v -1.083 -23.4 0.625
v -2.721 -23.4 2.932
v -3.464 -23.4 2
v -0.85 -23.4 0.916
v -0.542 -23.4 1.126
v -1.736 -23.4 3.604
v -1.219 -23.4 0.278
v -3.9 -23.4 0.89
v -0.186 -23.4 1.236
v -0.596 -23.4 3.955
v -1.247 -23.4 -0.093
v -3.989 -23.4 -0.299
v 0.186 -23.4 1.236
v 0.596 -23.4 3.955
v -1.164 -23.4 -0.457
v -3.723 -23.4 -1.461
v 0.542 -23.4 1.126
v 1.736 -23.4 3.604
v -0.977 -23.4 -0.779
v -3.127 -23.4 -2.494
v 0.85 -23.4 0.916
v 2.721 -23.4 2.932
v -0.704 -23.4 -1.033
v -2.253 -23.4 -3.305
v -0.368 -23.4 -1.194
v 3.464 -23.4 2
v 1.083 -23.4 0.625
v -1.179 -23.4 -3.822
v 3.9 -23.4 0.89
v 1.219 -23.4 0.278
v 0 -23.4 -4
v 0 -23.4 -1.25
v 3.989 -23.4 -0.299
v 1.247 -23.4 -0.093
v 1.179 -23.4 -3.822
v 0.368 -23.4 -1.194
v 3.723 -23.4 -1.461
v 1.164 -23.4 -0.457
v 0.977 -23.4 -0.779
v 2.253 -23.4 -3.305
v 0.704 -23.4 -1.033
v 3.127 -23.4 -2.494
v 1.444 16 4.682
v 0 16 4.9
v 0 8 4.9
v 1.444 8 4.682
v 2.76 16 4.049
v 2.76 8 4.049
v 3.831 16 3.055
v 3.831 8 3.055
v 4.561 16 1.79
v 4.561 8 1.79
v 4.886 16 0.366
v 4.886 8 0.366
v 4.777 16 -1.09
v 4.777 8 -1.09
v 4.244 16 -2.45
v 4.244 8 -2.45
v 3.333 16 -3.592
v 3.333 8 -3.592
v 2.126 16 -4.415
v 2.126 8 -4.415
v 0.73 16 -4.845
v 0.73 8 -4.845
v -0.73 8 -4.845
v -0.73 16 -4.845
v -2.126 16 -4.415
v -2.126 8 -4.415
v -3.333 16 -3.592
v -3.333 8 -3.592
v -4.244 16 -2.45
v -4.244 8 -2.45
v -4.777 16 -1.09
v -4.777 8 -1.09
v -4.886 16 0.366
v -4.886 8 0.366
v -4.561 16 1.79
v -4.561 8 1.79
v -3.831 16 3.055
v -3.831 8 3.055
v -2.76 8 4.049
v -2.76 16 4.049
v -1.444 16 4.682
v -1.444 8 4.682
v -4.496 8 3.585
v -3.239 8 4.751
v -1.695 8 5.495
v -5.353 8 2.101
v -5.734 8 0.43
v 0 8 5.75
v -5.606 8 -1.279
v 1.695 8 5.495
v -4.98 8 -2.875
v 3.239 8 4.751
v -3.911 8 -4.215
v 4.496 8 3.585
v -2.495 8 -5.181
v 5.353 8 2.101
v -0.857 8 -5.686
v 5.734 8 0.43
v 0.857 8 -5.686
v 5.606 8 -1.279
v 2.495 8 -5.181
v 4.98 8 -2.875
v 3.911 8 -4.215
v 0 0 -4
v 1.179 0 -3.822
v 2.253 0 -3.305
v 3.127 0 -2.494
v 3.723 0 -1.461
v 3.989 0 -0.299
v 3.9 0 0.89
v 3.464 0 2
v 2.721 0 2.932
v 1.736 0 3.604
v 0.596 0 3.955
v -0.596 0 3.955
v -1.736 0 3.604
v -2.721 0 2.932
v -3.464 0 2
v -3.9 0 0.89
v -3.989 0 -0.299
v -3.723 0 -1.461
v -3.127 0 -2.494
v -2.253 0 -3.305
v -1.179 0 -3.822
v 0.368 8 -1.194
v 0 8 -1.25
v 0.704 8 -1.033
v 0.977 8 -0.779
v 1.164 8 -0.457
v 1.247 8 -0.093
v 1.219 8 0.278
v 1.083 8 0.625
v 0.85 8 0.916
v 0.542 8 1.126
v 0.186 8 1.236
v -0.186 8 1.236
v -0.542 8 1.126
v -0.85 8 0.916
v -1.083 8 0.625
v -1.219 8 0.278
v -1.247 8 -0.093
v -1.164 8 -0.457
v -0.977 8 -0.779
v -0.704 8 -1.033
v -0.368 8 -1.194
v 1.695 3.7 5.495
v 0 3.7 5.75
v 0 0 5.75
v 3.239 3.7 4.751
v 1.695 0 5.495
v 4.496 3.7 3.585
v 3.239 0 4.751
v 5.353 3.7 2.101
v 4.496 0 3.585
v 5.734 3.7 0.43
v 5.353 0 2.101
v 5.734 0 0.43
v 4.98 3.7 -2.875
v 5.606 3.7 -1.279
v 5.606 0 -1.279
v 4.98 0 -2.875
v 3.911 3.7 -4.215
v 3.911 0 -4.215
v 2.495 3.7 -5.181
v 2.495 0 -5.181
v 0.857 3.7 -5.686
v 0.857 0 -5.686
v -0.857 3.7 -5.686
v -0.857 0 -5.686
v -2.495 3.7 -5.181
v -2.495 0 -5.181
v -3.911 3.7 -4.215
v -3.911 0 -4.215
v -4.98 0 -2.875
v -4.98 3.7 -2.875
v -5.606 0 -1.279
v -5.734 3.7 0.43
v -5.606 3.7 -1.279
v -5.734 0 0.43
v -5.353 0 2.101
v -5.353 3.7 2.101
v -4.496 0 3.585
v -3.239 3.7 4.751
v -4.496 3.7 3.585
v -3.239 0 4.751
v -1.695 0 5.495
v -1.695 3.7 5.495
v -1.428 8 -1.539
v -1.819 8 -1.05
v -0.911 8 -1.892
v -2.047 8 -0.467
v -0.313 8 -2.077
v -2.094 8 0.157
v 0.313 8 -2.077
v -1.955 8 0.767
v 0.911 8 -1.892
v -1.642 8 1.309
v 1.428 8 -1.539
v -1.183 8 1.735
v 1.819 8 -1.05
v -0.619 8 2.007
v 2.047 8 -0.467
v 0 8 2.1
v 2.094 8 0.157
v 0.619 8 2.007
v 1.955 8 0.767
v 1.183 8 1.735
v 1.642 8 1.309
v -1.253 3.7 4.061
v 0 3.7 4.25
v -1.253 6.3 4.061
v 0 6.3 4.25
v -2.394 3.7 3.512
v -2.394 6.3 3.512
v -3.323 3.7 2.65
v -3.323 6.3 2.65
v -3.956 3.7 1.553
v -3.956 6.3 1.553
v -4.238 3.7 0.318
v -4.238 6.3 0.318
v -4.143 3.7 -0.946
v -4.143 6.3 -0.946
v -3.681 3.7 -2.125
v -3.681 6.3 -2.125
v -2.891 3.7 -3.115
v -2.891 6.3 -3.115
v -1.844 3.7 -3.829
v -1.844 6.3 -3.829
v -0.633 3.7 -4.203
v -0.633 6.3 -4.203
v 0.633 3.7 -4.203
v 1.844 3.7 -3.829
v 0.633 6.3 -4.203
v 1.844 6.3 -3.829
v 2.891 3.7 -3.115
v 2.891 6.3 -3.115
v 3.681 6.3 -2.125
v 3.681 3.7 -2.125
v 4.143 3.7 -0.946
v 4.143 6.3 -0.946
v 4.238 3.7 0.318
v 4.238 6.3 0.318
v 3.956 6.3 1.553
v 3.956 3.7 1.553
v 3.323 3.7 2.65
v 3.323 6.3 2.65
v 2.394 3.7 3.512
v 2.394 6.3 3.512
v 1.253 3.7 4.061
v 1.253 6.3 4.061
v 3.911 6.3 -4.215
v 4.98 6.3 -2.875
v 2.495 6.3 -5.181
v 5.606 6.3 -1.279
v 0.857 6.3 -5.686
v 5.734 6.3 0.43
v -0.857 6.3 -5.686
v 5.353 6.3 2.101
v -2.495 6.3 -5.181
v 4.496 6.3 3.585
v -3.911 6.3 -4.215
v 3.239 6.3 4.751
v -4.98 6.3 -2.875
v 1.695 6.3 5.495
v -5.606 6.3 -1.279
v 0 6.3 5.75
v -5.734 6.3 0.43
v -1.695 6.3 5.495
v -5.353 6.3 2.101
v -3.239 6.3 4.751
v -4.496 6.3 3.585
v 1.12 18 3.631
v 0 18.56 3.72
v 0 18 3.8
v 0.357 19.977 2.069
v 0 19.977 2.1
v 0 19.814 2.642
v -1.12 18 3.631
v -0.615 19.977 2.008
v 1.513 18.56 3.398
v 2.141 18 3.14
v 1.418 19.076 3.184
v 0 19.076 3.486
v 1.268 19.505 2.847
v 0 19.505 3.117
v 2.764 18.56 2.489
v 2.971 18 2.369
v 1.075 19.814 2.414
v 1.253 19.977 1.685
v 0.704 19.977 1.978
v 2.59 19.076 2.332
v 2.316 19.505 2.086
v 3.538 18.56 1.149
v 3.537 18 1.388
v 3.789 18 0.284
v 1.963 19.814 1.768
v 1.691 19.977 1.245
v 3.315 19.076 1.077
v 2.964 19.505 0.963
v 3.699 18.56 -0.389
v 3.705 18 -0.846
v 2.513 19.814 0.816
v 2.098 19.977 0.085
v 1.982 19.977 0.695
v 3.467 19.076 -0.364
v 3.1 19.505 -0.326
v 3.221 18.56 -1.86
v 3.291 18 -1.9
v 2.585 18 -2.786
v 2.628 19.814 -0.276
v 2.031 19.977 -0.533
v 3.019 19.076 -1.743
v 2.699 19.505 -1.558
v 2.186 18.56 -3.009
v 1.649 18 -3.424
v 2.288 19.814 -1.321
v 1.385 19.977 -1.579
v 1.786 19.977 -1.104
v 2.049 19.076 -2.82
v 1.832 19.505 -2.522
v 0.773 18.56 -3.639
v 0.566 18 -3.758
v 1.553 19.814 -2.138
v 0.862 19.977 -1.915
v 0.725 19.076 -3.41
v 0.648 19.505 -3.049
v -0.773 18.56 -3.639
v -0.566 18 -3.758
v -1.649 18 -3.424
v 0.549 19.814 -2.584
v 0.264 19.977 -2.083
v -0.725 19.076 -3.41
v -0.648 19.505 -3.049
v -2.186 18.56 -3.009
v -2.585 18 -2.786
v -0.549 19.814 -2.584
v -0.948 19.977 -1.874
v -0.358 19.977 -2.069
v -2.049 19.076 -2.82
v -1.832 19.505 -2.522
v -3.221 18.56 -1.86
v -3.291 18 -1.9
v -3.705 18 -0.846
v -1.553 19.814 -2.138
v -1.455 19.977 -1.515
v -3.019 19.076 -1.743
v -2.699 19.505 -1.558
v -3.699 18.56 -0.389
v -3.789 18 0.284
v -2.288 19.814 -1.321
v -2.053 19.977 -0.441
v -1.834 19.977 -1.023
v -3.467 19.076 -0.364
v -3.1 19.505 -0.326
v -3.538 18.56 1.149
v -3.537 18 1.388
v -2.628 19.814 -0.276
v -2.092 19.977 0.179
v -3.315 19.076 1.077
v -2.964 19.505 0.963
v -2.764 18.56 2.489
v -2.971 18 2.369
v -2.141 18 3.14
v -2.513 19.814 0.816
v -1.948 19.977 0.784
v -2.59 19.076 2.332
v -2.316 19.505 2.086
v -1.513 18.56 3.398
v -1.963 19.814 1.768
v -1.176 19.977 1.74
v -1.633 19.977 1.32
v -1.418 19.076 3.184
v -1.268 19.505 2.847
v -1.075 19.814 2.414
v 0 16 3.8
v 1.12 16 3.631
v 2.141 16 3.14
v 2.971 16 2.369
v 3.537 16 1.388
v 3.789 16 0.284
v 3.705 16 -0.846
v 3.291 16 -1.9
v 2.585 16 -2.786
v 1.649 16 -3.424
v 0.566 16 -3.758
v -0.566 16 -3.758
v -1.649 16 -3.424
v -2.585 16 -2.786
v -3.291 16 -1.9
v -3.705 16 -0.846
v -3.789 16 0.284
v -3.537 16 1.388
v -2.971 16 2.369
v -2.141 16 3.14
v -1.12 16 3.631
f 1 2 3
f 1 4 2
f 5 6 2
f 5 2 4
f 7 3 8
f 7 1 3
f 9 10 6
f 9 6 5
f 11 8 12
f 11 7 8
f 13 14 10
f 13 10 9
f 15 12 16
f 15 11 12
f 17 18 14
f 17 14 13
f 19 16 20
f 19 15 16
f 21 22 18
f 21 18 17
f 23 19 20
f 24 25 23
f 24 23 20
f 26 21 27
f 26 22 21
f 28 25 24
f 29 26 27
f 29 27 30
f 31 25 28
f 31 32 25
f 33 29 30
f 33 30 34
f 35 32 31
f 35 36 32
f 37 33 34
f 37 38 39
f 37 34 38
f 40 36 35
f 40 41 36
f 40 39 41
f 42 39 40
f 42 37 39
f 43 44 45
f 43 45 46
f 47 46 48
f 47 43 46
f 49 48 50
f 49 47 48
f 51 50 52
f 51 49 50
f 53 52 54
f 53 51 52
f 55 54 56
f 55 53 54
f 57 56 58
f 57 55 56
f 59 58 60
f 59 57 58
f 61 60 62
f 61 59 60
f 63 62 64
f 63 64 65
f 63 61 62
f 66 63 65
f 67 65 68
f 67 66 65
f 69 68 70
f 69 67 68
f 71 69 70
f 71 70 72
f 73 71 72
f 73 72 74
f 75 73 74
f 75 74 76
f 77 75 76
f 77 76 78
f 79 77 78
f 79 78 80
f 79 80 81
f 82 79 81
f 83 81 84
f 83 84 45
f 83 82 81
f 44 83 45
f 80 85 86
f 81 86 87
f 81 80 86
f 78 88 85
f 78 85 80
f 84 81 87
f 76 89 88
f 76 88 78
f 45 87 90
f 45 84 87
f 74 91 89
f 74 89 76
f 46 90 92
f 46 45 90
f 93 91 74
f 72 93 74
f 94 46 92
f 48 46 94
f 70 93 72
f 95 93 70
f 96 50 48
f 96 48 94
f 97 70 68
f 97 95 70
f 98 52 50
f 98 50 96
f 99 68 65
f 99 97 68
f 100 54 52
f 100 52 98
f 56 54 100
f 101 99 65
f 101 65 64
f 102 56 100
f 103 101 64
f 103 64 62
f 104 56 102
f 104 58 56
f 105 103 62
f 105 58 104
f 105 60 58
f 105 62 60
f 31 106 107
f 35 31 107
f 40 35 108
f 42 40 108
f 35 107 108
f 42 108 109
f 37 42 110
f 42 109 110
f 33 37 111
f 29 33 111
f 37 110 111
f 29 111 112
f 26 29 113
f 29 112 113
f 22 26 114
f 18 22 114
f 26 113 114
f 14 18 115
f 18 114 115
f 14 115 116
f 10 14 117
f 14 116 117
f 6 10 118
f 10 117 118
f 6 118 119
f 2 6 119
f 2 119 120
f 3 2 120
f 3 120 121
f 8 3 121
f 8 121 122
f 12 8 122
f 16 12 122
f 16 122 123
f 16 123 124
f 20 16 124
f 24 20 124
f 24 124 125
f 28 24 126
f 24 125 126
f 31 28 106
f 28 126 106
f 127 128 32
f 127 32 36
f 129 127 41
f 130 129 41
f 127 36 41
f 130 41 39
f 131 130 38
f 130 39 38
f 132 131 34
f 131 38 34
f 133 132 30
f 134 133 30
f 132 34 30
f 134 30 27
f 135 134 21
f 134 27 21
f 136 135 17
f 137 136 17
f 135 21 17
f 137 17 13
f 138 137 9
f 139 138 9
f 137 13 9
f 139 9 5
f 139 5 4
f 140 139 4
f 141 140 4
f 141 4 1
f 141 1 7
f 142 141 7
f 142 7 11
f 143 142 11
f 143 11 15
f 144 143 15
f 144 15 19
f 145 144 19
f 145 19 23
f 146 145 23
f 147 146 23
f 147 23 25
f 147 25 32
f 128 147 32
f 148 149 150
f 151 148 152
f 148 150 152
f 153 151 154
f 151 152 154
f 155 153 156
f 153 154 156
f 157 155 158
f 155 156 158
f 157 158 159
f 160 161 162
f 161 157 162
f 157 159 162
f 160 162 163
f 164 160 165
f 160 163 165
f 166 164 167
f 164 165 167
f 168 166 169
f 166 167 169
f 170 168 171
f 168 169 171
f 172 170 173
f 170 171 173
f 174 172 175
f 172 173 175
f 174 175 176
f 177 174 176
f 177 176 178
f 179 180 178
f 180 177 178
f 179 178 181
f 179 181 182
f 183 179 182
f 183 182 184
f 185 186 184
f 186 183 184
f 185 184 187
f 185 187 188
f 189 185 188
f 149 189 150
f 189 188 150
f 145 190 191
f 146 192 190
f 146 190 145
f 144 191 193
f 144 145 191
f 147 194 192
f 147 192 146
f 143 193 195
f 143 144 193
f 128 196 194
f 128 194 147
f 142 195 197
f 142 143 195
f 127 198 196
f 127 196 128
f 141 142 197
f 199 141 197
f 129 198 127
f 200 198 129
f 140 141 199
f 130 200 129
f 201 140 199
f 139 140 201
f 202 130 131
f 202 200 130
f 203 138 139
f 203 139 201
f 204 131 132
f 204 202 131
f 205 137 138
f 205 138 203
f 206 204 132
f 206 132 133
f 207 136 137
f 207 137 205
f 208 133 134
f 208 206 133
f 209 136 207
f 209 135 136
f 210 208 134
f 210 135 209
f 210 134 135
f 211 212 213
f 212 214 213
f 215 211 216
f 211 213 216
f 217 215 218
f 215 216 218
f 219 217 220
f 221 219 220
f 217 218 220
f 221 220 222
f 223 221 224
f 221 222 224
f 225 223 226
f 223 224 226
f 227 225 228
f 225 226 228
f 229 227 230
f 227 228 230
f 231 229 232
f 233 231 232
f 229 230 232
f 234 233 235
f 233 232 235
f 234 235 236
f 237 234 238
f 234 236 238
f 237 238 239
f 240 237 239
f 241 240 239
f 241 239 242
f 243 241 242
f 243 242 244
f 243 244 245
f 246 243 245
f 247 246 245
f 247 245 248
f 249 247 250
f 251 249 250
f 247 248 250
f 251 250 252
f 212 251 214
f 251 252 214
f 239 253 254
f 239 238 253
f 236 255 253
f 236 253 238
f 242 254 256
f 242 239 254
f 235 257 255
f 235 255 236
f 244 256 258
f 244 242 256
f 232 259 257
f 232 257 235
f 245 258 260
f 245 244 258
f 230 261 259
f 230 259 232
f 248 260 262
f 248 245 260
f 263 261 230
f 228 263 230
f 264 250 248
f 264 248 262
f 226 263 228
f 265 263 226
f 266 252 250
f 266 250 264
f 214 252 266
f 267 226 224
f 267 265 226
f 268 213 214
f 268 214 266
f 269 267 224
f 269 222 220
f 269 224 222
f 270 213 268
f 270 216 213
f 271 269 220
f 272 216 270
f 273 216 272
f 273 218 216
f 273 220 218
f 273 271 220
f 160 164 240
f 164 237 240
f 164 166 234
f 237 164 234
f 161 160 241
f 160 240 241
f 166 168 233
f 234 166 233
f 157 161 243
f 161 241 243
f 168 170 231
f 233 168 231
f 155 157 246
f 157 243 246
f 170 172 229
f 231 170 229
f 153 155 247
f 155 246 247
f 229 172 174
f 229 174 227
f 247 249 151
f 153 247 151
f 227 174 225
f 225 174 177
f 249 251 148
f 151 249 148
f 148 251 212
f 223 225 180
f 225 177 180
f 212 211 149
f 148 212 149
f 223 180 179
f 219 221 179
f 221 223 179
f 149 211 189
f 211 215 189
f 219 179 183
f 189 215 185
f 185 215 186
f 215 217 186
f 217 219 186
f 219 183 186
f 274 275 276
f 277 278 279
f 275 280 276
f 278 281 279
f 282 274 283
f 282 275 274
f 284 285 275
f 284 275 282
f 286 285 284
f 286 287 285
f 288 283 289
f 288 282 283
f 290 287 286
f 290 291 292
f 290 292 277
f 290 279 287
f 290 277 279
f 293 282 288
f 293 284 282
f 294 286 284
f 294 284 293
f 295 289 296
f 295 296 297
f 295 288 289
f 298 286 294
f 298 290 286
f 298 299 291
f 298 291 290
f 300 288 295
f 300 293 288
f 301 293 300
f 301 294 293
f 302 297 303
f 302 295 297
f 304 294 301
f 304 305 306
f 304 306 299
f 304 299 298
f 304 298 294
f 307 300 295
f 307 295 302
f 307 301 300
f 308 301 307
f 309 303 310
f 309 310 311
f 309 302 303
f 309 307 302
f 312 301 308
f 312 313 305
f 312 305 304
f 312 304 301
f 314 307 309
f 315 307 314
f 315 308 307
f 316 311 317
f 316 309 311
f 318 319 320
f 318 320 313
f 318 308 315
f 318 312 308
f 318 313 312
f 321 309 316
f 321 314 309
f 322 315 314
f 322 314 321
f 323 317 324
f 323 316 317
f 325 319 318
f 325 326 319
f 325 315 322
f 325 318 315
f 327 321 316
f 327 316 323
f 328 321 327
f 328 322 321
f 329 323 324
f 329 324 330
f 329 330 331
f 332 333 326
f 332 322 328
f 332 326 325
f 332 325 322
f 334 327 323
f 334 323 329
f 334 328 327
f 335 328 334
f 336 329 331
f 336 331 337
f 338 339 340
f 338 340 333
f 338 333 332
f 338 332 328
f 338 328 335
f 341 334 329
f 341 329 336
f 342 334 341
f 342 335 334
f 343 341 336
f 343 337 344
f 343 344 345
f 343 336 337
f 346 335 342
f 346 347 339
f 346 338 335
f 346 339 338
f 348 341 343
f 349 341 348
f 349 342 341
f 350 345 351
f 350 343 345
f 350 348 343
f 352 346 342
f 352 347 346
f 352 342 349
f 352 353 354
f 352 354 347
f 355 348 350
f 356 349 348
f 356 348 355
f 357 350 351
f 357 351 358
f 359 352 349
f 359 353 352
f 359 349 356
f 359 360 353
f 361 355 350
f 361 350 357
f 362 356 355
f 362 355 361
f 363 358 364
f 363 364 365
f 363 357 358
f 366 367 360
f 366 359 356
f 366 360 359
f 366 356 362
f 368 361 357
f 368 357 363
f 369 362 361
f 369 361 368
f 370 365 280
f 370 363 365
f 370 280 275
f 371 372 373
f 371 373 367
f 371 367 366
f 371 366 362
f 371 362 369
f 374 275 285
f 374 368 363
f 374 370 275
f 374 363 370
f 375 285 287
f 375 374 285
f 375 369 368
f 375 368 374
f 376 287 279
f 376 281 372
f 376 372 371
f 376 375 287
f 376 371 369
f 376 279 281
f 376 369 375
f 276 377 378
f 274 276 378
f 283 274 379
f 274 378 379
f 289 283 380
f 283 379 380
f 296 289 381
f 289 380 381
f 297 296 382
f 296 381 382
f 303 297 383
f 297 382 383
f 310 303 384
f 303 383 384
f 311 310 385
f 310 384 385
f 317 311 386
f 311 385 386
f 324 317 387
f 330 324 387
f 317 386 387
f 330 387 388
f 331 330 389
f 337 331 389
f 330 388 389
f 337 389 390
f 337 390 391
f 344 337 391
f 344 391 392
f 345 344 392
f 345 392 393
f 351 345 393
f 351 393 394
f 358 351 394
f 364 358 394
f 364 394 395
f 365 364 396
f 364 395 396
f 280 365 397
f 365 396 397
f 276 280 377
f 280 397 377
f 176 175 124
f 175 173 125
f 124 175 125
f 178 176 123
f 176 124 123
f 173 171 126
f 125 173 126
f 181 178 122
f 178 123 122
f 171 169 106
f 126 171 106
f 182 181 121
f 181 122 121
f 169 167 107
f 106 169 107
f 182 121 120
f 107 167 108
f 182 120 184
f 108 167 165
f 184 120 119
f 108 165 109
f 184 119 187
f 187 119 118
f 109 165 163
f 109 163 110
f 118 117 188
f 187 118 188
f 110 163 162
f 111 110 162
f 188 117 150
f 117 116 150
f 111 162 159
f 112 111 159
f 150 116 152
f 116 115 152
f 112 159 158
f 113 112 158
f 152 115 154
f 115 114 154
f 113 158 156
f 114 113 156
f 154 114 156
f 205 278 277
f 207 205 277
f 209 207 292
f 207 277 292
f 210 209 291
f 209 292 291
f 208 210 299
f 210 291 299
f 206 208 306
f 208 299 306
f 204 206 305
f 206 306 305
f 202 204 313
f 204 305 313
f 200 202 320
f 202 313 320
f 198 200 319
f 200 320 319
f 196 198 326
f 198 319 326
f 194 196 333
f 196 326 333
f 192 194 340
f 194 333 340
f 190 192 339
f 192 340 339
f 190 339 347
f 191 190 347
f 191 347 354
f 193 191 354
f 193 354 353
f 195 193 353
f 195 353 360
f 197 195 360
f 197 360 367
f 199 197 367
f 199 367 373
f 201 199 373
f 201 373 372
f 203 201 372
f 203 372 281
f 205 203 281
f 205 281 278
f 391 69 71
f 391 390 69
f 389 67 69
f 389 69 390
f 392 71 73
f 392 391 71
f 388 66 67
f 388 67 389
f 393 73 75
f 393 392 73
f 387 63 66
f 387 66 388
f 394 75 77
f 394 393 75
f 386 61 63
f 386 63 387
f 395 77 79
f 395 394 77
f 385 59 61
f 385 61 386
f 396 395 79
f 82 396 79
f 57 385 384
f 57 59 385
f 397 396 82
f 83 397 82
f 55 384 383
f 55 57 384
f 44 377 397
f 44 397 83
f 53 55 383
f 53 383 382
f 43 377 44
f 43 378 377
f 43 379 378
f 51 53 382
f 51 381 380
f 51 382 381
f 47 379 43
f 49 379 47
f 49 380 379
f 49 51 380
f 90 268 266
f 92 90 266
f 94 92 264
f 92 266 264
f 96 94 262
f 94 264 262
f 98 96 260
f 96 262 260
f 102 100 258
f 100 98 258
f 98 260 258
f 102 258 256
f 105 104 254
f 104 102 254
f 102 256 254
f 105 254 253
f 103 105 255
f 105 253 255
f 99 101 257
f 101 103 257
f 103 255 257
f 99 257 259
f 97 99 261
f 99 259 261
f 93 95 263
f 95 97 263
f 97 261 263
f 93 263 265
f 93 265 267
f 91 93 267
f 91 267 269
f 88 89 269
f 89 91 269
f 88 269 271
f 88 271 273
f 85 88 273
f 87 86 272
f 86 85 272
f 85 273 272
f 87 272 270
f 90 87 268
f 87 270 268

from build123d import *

# Parameters (mm, degrees)
SKETCH1_R           = 5.75
BOSS_EXTRUDE1_DEPTH = 16
SKETCH2_OUTSIDE_W   = 18.062
SKETCH2_OUTSIDE_H   = 18.062
SKETCH2_OUTSIDE_R   = 4.9
CUT_EXTRUDE1_DEPTH  = 8
SKETCH3_R           = 3.8
BOSS_EXTRUDE2_DEPTH = 4
FILLET2_R           = 2
SKETCH4_R           = 4
BOSS_EXTRUDE3_DEPTH = 23.4
SKETCH12_W          = 1.5
SKETCH12_H          = 2.6
CUT_EXTRUDE2_REACH  = 46.155
SKETCH5_R           = 1.25
SKETCH13_R          = 2.1
CUT_EXTRUDE3_DEPTH  = 12


with BuildPart() as part:
    # Sketch1 → Boss-Extrude1 (new body)
    with BuildSketch(Plane(origin=(0, 0, 0), x_dir=(1, 0, 0), z_dir=(0, 1, 0))):
        with Locations(Location((0, 0, 0), (0, 0, 270))):
            Circle(SKETCH1_R)
    extrude(amount=BOSS_EXTRUDE1_DEPTH)

    # Sketch2 outside → Cut-Extrude1 (cut)
    with BuildSketch(Plane(origin=(0, 16, 0), x_dir=(1, 0, 0), z_dir=(0, 1, 0))):
        Rectangle(SKETCH2_OUTSIDE_W, SKETCH2_OUTSIDE_H)
        with Locations(Location((0, 0, 0), (0, 0, 270))):
            Circle(SKETCH2_OUTSIDE_R, mode=Mode.SUBTRACT)
    extrude(amount=-CUT_EXTRUDE1_DEPTH, mode=Mode.SUBTRACT)

    # Sketch3 → Boss-Extrude2 (add)
    with BuildSketch(Plane(origin=(0, 16, 0), x_dir=(1, 0, 0), z_dir=(0, 1, 0))):
        with Locations(Location((0, 0, 0), (0, 0, 270))):
            Circle(SKETCH3_R)
    extrude(amount=BOSS_EXTRUDE2_DEPTH)

    # Fillet2
    fillet2_edges = [part.edges().sort_by_distance(p)[0] for p in [
        (0, 20, -3.8),
    ]]
    fillet(fillet2_edges, radius=FILLET2_R)

    # Sketch4 → Boss-Extrude3 (add)
    with BuildSketch(Plane.XZ):
        with Locations(Location((0, 0, 0), (0, 0, 270))):
            Circle(SKETCH4_R)
    extrude(amount=BOSS_EXTRUDE3_DEPTH)

    # Sketch12 → Cut-Revolve2 (revolve, cut)
    with BuildSketch(Plane(origin=(0, 0, 0), x_dir=(0, 0, -1), z_dir=(1, 0, 0))):
        with Locations((-5, 5)):
            Rectangle(SKETCH12_W, SKETCH12_H)
    revolve(axis=Axis((0, 8, 0), (0, -1, 0)), mode=Mode.SUBTRACT)

    # Sketch5 → Cut-Extrude2 (cut, up to next)
    with BuildSketch(Plane.XZ.offset(23.4), mode=Mode.PRIVATE) as cut_extrude2_sk1:
        with Locations(Location((0, 0, 0), (0, 0, 270))):
            Circle(SKETCH5_R)
    cut_extrude2_tool1 = extrude(cut_extrude2_sk1.sketch, amount=-CUT_EXTRUDE2_REACH, mode=Mode.PRIVATE) & part.part
    add(cut_extrude2_tool1.solids().sort_by_distance((0, -23.4, 0))[0], mode=Mode.SUBTRACT)

    # Sketch13 → Cut-Extrude3 (cut)
    with BuildSketch(Plane(origin=(0, 20, 0), x_dir=(1, 0, 0), z_dir=(0, 1, 0))):
        with Locations(Location((0, 0, 0), (0, 0, 270))):
            Circle(SKETCH13_R)
    extrude(amount=-CUT_EXTRUDE3_DEPTH, mode=Mode.SUBTRACT)


solid = part.part
